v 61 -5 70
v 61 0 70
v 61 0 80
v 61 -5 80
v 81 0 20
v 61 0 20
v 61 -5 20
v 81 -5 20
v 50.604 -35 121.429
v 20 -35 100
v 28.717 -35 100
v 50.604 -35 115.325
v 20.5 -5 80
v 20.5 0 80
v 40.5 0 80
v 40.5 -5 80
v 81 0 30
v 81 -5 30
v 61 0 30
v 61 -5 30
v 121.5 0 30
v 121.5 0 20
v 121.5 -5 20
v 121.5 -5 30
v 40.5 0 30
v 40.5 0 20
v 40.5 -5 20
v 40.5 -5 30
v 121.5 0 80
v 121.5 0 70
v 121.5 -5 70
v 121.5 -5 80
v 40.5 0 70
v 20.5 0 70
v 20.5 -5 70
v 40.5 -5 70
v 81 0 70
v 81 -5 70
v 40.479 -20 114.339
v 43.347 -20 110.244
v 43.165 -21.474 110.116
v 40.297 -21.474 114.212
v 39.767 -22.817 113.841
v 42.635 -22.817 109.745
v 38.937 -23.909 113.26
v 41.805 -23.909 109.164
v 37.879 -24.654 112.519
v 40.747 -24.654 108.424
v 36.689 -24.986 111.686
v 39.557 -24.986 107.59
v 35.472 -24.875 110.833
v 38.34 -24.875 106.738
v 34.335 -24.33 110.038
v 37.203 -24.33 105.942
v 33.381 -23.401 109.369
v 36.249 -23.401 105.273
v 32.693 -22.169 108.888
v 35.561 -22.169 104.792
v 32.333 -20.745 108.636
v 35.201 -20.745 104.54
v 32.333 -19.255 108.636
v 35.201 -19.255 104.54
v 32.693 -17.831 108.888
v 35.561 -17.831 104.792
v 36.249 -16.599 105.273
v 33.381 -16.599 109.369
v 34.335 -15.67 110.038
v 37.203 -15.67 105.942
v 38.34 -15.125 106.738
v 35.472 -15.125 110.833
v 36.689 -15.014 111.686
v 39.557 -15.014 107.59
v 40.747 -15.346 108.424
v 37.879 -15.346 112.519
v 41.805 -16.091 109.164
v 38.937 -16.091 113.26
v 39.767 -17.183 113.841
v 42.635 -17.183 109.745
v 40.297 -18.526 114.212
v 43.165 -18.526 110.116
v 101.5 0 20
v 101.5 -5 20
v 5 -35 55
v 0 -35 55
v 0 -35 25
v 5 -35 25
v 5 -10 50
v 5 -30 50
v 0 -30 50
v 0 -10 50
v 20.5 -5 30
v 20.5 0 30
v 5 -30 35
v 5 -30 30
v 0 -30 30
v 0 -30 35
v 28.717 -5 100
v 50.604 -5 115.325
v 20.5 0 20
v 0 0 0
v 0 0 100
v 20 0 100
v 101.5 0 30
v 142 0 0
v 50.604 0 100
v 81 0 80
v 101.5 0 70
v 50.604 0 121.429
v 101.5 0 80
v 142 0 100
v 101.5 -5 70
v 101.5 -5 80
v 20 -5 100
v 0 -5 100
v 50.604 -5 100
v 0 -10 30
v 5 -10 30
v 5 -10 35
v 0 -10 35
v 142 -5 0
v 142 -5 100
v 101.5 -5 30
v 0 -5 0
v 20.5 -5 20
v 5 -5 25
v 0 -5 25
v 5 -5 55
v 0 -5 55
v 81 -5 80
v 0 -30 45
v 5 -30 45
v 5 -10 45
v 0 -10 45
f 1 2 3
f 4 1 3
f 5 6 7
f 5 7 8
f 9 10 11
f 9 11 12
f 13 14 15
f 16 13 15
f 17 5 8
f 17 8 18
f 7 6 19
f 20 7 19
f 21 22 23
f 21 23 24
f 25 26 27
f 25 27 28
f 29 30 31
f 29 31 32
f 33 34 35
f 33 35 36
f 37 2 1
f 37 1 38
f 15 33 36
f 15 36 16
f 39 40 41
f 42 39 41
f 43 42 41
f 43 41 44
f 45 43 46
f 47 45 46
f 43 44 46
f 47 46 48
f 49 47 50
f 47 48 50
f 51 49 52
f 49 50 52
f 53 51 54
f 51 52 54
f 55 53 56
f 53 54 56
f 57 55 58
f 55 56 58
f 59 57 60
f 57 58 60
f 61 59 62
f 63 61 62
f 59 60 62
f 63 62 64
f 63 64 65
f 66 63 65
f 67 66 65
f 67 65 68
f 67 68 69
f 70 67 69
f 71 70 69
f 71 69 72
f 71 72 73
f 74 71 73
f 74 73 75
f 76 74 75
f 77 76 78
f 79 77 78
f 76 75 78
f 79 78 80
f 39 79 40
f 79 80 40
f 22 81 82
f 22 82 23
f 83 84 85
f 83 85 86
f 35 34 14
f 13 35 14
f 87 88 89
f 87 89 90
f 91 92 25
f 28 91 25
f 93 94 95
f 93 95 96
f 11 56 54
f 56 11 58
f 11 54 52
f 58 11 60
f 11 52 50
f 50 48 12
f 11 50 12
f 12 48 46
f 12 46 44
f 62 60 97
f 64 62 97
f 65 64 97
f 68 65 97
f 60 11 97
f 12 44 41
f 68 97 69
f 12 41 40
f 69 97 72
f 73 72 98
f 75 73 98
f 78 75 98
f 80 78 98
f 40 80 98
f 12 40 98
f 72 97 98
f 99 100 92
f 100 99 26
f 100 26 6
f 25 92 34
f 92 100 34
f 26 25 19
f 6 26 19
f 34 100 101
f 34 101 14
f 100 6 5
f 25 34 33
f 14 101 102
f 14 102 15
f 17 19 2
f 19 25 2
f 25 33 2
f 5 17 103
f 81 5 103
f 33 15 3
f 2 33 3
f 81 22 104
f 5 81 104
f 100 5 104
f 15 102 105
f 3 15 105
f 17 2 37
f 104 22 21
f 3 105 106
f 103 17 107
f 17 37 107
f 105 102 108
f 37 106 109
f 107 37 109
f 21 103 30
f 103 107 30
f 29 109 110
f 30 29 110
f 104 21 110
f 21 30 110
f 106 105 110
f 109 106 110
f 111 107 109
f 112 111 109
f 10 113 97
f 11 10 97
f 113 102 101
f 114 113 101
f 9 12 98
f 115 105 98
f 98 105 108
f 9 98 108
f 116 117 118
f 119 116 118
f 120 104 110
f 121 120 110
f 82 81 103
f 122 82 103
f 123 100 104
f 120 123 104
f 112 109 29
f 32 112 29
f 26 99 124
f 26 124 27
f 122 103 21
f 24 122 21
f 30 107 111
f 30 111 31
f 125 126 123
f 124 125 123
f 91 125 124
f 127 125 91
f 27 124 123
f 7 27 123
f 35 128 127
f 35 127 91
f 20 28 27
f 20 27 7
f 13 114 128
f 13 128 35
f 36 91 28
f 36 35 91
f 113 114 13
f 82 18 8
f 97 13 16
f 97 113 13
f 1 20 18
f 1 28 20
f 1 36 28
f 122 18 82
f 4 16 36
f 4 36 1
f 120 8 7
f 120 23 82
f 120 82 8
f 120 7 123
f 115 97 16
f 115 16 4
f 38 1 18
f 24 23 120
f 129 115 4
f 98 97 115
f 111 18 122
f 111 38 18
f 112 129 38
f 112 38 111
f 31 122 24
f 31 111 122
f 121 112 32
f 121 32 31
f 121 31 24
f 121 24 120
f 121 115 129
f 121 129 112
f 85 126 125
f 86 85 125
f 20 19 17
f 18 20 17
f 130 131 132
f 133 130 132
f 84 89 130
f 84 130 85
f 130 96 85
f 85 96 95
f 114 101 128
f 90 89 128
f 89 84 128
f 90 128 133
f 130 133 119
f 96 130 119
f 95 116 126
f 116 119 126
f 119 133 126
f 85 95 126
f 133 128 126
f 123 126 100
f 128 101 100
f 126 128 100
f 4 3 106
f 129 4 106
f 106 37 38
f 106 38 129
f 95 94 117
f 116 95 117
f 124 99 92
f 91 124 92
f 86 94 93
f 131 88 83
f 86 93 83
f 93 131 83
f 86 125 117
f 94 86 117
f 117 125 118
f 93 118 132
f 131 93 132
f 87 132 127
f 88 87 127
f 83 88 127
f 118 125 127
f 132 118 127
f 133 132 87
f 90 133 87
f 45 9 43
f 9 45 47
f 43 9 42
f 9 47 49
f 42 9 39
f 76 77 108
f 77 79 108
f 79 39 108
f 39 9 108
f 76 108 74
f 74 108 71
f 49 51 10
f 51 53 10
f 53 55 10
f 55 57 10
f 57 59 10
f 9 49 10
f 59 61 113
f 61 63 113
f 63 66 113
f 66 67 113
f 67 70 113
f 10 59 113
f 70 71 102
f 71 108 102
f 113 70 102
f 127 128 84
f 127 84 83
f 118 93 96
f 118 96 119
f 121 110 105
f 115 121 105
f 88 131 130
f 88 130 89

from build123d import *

# Parameters (mm, degrees)
F0_W     = 20
F0_H     = 10
F1_DEPTH = 5
F2_W     = 5
F2_H     = 30
F3_DEPTH = 30
F4_W     = 20
F4_H     = 5
F5_DEPTH = 5
F6_R     = 5
F7_DEPTH = 5


with BuildPart() as f1:
    # F0 (on Front) → F1 (new body)
    with BuildSketch(Plane.XZ):
        Polygon((0, 100), (0, 0), (142, 0), (142, 100), (50.6040596026, 100), (50.6040596026, 121.4291932336), (20, 100), align=None)
        with Locations((30.5, 25)):
            Rectangle(F0_W, F0_H, mode=Mode.SUBTRACT)
        with Locations((71, 25)):
            Rectangle(F0_W, F0_H, mode=Mode.SUBTRACT)
        with Locations((111.5, 25)):
            Rectangle(F0_W, F0_H, mode=Mode.SUBTRACT)
        with Locations((30.5, 75)):
            Rectangle(F0_W, F0_H, mode=Mode.SUBTRACT)
        with Locations((71, 75)):
            Rectangle(F0_W, F0_H, mode=Mode.SUBTRACT)
        with Locations((111.5, 75)):
            Rectangle(F0_W, F0_H, mode=Mode.SUBTRACT)
    extrude(amount=F1_DEPTH)

    # F2 (on face) → F3 (join)
    with BuildSketch(Plane.XZ.offset(5)):
        with Locations((2.5, 40)):
            Rectangle(F2_W, F2_H)
        Polygon((50.6040596026, 121.4291932336), (20, 100), (28.7172339781, 100), (50.6040596026, 115.3253202898), align=None)
    extrude(amount=F3_DEPTH)

    # F4 (on face) → F5 (cut, through all)
    with BuildSketch(Plane.YZ.offset(5)):
        with Locations((-20, 47.5)):
            Rectangle(F4_W, F4_H)
        with Locations((-20, 32.5)):
            Rectangle(F4_W, F4_H)
    extrude(amount=-F5_DEPTH, mode=Mode.SUBTRACT)

    # F6 (on face) → F7 (cut, through all)
    with BuildSketch(Plane(origin=(-37.5369502908, 0, 53.608320737), x_dir=(0.8191520443, 0, 0.5735764364), z_dir=(0.5735764364, 0, -0.8191520443))):
        with Locations((93.7406845209, 20)):
            Circle(F6_R)
    extrude(amount=-F7_DEPTH, mode=Mode.SUBTRACT)


solid = f1.part
